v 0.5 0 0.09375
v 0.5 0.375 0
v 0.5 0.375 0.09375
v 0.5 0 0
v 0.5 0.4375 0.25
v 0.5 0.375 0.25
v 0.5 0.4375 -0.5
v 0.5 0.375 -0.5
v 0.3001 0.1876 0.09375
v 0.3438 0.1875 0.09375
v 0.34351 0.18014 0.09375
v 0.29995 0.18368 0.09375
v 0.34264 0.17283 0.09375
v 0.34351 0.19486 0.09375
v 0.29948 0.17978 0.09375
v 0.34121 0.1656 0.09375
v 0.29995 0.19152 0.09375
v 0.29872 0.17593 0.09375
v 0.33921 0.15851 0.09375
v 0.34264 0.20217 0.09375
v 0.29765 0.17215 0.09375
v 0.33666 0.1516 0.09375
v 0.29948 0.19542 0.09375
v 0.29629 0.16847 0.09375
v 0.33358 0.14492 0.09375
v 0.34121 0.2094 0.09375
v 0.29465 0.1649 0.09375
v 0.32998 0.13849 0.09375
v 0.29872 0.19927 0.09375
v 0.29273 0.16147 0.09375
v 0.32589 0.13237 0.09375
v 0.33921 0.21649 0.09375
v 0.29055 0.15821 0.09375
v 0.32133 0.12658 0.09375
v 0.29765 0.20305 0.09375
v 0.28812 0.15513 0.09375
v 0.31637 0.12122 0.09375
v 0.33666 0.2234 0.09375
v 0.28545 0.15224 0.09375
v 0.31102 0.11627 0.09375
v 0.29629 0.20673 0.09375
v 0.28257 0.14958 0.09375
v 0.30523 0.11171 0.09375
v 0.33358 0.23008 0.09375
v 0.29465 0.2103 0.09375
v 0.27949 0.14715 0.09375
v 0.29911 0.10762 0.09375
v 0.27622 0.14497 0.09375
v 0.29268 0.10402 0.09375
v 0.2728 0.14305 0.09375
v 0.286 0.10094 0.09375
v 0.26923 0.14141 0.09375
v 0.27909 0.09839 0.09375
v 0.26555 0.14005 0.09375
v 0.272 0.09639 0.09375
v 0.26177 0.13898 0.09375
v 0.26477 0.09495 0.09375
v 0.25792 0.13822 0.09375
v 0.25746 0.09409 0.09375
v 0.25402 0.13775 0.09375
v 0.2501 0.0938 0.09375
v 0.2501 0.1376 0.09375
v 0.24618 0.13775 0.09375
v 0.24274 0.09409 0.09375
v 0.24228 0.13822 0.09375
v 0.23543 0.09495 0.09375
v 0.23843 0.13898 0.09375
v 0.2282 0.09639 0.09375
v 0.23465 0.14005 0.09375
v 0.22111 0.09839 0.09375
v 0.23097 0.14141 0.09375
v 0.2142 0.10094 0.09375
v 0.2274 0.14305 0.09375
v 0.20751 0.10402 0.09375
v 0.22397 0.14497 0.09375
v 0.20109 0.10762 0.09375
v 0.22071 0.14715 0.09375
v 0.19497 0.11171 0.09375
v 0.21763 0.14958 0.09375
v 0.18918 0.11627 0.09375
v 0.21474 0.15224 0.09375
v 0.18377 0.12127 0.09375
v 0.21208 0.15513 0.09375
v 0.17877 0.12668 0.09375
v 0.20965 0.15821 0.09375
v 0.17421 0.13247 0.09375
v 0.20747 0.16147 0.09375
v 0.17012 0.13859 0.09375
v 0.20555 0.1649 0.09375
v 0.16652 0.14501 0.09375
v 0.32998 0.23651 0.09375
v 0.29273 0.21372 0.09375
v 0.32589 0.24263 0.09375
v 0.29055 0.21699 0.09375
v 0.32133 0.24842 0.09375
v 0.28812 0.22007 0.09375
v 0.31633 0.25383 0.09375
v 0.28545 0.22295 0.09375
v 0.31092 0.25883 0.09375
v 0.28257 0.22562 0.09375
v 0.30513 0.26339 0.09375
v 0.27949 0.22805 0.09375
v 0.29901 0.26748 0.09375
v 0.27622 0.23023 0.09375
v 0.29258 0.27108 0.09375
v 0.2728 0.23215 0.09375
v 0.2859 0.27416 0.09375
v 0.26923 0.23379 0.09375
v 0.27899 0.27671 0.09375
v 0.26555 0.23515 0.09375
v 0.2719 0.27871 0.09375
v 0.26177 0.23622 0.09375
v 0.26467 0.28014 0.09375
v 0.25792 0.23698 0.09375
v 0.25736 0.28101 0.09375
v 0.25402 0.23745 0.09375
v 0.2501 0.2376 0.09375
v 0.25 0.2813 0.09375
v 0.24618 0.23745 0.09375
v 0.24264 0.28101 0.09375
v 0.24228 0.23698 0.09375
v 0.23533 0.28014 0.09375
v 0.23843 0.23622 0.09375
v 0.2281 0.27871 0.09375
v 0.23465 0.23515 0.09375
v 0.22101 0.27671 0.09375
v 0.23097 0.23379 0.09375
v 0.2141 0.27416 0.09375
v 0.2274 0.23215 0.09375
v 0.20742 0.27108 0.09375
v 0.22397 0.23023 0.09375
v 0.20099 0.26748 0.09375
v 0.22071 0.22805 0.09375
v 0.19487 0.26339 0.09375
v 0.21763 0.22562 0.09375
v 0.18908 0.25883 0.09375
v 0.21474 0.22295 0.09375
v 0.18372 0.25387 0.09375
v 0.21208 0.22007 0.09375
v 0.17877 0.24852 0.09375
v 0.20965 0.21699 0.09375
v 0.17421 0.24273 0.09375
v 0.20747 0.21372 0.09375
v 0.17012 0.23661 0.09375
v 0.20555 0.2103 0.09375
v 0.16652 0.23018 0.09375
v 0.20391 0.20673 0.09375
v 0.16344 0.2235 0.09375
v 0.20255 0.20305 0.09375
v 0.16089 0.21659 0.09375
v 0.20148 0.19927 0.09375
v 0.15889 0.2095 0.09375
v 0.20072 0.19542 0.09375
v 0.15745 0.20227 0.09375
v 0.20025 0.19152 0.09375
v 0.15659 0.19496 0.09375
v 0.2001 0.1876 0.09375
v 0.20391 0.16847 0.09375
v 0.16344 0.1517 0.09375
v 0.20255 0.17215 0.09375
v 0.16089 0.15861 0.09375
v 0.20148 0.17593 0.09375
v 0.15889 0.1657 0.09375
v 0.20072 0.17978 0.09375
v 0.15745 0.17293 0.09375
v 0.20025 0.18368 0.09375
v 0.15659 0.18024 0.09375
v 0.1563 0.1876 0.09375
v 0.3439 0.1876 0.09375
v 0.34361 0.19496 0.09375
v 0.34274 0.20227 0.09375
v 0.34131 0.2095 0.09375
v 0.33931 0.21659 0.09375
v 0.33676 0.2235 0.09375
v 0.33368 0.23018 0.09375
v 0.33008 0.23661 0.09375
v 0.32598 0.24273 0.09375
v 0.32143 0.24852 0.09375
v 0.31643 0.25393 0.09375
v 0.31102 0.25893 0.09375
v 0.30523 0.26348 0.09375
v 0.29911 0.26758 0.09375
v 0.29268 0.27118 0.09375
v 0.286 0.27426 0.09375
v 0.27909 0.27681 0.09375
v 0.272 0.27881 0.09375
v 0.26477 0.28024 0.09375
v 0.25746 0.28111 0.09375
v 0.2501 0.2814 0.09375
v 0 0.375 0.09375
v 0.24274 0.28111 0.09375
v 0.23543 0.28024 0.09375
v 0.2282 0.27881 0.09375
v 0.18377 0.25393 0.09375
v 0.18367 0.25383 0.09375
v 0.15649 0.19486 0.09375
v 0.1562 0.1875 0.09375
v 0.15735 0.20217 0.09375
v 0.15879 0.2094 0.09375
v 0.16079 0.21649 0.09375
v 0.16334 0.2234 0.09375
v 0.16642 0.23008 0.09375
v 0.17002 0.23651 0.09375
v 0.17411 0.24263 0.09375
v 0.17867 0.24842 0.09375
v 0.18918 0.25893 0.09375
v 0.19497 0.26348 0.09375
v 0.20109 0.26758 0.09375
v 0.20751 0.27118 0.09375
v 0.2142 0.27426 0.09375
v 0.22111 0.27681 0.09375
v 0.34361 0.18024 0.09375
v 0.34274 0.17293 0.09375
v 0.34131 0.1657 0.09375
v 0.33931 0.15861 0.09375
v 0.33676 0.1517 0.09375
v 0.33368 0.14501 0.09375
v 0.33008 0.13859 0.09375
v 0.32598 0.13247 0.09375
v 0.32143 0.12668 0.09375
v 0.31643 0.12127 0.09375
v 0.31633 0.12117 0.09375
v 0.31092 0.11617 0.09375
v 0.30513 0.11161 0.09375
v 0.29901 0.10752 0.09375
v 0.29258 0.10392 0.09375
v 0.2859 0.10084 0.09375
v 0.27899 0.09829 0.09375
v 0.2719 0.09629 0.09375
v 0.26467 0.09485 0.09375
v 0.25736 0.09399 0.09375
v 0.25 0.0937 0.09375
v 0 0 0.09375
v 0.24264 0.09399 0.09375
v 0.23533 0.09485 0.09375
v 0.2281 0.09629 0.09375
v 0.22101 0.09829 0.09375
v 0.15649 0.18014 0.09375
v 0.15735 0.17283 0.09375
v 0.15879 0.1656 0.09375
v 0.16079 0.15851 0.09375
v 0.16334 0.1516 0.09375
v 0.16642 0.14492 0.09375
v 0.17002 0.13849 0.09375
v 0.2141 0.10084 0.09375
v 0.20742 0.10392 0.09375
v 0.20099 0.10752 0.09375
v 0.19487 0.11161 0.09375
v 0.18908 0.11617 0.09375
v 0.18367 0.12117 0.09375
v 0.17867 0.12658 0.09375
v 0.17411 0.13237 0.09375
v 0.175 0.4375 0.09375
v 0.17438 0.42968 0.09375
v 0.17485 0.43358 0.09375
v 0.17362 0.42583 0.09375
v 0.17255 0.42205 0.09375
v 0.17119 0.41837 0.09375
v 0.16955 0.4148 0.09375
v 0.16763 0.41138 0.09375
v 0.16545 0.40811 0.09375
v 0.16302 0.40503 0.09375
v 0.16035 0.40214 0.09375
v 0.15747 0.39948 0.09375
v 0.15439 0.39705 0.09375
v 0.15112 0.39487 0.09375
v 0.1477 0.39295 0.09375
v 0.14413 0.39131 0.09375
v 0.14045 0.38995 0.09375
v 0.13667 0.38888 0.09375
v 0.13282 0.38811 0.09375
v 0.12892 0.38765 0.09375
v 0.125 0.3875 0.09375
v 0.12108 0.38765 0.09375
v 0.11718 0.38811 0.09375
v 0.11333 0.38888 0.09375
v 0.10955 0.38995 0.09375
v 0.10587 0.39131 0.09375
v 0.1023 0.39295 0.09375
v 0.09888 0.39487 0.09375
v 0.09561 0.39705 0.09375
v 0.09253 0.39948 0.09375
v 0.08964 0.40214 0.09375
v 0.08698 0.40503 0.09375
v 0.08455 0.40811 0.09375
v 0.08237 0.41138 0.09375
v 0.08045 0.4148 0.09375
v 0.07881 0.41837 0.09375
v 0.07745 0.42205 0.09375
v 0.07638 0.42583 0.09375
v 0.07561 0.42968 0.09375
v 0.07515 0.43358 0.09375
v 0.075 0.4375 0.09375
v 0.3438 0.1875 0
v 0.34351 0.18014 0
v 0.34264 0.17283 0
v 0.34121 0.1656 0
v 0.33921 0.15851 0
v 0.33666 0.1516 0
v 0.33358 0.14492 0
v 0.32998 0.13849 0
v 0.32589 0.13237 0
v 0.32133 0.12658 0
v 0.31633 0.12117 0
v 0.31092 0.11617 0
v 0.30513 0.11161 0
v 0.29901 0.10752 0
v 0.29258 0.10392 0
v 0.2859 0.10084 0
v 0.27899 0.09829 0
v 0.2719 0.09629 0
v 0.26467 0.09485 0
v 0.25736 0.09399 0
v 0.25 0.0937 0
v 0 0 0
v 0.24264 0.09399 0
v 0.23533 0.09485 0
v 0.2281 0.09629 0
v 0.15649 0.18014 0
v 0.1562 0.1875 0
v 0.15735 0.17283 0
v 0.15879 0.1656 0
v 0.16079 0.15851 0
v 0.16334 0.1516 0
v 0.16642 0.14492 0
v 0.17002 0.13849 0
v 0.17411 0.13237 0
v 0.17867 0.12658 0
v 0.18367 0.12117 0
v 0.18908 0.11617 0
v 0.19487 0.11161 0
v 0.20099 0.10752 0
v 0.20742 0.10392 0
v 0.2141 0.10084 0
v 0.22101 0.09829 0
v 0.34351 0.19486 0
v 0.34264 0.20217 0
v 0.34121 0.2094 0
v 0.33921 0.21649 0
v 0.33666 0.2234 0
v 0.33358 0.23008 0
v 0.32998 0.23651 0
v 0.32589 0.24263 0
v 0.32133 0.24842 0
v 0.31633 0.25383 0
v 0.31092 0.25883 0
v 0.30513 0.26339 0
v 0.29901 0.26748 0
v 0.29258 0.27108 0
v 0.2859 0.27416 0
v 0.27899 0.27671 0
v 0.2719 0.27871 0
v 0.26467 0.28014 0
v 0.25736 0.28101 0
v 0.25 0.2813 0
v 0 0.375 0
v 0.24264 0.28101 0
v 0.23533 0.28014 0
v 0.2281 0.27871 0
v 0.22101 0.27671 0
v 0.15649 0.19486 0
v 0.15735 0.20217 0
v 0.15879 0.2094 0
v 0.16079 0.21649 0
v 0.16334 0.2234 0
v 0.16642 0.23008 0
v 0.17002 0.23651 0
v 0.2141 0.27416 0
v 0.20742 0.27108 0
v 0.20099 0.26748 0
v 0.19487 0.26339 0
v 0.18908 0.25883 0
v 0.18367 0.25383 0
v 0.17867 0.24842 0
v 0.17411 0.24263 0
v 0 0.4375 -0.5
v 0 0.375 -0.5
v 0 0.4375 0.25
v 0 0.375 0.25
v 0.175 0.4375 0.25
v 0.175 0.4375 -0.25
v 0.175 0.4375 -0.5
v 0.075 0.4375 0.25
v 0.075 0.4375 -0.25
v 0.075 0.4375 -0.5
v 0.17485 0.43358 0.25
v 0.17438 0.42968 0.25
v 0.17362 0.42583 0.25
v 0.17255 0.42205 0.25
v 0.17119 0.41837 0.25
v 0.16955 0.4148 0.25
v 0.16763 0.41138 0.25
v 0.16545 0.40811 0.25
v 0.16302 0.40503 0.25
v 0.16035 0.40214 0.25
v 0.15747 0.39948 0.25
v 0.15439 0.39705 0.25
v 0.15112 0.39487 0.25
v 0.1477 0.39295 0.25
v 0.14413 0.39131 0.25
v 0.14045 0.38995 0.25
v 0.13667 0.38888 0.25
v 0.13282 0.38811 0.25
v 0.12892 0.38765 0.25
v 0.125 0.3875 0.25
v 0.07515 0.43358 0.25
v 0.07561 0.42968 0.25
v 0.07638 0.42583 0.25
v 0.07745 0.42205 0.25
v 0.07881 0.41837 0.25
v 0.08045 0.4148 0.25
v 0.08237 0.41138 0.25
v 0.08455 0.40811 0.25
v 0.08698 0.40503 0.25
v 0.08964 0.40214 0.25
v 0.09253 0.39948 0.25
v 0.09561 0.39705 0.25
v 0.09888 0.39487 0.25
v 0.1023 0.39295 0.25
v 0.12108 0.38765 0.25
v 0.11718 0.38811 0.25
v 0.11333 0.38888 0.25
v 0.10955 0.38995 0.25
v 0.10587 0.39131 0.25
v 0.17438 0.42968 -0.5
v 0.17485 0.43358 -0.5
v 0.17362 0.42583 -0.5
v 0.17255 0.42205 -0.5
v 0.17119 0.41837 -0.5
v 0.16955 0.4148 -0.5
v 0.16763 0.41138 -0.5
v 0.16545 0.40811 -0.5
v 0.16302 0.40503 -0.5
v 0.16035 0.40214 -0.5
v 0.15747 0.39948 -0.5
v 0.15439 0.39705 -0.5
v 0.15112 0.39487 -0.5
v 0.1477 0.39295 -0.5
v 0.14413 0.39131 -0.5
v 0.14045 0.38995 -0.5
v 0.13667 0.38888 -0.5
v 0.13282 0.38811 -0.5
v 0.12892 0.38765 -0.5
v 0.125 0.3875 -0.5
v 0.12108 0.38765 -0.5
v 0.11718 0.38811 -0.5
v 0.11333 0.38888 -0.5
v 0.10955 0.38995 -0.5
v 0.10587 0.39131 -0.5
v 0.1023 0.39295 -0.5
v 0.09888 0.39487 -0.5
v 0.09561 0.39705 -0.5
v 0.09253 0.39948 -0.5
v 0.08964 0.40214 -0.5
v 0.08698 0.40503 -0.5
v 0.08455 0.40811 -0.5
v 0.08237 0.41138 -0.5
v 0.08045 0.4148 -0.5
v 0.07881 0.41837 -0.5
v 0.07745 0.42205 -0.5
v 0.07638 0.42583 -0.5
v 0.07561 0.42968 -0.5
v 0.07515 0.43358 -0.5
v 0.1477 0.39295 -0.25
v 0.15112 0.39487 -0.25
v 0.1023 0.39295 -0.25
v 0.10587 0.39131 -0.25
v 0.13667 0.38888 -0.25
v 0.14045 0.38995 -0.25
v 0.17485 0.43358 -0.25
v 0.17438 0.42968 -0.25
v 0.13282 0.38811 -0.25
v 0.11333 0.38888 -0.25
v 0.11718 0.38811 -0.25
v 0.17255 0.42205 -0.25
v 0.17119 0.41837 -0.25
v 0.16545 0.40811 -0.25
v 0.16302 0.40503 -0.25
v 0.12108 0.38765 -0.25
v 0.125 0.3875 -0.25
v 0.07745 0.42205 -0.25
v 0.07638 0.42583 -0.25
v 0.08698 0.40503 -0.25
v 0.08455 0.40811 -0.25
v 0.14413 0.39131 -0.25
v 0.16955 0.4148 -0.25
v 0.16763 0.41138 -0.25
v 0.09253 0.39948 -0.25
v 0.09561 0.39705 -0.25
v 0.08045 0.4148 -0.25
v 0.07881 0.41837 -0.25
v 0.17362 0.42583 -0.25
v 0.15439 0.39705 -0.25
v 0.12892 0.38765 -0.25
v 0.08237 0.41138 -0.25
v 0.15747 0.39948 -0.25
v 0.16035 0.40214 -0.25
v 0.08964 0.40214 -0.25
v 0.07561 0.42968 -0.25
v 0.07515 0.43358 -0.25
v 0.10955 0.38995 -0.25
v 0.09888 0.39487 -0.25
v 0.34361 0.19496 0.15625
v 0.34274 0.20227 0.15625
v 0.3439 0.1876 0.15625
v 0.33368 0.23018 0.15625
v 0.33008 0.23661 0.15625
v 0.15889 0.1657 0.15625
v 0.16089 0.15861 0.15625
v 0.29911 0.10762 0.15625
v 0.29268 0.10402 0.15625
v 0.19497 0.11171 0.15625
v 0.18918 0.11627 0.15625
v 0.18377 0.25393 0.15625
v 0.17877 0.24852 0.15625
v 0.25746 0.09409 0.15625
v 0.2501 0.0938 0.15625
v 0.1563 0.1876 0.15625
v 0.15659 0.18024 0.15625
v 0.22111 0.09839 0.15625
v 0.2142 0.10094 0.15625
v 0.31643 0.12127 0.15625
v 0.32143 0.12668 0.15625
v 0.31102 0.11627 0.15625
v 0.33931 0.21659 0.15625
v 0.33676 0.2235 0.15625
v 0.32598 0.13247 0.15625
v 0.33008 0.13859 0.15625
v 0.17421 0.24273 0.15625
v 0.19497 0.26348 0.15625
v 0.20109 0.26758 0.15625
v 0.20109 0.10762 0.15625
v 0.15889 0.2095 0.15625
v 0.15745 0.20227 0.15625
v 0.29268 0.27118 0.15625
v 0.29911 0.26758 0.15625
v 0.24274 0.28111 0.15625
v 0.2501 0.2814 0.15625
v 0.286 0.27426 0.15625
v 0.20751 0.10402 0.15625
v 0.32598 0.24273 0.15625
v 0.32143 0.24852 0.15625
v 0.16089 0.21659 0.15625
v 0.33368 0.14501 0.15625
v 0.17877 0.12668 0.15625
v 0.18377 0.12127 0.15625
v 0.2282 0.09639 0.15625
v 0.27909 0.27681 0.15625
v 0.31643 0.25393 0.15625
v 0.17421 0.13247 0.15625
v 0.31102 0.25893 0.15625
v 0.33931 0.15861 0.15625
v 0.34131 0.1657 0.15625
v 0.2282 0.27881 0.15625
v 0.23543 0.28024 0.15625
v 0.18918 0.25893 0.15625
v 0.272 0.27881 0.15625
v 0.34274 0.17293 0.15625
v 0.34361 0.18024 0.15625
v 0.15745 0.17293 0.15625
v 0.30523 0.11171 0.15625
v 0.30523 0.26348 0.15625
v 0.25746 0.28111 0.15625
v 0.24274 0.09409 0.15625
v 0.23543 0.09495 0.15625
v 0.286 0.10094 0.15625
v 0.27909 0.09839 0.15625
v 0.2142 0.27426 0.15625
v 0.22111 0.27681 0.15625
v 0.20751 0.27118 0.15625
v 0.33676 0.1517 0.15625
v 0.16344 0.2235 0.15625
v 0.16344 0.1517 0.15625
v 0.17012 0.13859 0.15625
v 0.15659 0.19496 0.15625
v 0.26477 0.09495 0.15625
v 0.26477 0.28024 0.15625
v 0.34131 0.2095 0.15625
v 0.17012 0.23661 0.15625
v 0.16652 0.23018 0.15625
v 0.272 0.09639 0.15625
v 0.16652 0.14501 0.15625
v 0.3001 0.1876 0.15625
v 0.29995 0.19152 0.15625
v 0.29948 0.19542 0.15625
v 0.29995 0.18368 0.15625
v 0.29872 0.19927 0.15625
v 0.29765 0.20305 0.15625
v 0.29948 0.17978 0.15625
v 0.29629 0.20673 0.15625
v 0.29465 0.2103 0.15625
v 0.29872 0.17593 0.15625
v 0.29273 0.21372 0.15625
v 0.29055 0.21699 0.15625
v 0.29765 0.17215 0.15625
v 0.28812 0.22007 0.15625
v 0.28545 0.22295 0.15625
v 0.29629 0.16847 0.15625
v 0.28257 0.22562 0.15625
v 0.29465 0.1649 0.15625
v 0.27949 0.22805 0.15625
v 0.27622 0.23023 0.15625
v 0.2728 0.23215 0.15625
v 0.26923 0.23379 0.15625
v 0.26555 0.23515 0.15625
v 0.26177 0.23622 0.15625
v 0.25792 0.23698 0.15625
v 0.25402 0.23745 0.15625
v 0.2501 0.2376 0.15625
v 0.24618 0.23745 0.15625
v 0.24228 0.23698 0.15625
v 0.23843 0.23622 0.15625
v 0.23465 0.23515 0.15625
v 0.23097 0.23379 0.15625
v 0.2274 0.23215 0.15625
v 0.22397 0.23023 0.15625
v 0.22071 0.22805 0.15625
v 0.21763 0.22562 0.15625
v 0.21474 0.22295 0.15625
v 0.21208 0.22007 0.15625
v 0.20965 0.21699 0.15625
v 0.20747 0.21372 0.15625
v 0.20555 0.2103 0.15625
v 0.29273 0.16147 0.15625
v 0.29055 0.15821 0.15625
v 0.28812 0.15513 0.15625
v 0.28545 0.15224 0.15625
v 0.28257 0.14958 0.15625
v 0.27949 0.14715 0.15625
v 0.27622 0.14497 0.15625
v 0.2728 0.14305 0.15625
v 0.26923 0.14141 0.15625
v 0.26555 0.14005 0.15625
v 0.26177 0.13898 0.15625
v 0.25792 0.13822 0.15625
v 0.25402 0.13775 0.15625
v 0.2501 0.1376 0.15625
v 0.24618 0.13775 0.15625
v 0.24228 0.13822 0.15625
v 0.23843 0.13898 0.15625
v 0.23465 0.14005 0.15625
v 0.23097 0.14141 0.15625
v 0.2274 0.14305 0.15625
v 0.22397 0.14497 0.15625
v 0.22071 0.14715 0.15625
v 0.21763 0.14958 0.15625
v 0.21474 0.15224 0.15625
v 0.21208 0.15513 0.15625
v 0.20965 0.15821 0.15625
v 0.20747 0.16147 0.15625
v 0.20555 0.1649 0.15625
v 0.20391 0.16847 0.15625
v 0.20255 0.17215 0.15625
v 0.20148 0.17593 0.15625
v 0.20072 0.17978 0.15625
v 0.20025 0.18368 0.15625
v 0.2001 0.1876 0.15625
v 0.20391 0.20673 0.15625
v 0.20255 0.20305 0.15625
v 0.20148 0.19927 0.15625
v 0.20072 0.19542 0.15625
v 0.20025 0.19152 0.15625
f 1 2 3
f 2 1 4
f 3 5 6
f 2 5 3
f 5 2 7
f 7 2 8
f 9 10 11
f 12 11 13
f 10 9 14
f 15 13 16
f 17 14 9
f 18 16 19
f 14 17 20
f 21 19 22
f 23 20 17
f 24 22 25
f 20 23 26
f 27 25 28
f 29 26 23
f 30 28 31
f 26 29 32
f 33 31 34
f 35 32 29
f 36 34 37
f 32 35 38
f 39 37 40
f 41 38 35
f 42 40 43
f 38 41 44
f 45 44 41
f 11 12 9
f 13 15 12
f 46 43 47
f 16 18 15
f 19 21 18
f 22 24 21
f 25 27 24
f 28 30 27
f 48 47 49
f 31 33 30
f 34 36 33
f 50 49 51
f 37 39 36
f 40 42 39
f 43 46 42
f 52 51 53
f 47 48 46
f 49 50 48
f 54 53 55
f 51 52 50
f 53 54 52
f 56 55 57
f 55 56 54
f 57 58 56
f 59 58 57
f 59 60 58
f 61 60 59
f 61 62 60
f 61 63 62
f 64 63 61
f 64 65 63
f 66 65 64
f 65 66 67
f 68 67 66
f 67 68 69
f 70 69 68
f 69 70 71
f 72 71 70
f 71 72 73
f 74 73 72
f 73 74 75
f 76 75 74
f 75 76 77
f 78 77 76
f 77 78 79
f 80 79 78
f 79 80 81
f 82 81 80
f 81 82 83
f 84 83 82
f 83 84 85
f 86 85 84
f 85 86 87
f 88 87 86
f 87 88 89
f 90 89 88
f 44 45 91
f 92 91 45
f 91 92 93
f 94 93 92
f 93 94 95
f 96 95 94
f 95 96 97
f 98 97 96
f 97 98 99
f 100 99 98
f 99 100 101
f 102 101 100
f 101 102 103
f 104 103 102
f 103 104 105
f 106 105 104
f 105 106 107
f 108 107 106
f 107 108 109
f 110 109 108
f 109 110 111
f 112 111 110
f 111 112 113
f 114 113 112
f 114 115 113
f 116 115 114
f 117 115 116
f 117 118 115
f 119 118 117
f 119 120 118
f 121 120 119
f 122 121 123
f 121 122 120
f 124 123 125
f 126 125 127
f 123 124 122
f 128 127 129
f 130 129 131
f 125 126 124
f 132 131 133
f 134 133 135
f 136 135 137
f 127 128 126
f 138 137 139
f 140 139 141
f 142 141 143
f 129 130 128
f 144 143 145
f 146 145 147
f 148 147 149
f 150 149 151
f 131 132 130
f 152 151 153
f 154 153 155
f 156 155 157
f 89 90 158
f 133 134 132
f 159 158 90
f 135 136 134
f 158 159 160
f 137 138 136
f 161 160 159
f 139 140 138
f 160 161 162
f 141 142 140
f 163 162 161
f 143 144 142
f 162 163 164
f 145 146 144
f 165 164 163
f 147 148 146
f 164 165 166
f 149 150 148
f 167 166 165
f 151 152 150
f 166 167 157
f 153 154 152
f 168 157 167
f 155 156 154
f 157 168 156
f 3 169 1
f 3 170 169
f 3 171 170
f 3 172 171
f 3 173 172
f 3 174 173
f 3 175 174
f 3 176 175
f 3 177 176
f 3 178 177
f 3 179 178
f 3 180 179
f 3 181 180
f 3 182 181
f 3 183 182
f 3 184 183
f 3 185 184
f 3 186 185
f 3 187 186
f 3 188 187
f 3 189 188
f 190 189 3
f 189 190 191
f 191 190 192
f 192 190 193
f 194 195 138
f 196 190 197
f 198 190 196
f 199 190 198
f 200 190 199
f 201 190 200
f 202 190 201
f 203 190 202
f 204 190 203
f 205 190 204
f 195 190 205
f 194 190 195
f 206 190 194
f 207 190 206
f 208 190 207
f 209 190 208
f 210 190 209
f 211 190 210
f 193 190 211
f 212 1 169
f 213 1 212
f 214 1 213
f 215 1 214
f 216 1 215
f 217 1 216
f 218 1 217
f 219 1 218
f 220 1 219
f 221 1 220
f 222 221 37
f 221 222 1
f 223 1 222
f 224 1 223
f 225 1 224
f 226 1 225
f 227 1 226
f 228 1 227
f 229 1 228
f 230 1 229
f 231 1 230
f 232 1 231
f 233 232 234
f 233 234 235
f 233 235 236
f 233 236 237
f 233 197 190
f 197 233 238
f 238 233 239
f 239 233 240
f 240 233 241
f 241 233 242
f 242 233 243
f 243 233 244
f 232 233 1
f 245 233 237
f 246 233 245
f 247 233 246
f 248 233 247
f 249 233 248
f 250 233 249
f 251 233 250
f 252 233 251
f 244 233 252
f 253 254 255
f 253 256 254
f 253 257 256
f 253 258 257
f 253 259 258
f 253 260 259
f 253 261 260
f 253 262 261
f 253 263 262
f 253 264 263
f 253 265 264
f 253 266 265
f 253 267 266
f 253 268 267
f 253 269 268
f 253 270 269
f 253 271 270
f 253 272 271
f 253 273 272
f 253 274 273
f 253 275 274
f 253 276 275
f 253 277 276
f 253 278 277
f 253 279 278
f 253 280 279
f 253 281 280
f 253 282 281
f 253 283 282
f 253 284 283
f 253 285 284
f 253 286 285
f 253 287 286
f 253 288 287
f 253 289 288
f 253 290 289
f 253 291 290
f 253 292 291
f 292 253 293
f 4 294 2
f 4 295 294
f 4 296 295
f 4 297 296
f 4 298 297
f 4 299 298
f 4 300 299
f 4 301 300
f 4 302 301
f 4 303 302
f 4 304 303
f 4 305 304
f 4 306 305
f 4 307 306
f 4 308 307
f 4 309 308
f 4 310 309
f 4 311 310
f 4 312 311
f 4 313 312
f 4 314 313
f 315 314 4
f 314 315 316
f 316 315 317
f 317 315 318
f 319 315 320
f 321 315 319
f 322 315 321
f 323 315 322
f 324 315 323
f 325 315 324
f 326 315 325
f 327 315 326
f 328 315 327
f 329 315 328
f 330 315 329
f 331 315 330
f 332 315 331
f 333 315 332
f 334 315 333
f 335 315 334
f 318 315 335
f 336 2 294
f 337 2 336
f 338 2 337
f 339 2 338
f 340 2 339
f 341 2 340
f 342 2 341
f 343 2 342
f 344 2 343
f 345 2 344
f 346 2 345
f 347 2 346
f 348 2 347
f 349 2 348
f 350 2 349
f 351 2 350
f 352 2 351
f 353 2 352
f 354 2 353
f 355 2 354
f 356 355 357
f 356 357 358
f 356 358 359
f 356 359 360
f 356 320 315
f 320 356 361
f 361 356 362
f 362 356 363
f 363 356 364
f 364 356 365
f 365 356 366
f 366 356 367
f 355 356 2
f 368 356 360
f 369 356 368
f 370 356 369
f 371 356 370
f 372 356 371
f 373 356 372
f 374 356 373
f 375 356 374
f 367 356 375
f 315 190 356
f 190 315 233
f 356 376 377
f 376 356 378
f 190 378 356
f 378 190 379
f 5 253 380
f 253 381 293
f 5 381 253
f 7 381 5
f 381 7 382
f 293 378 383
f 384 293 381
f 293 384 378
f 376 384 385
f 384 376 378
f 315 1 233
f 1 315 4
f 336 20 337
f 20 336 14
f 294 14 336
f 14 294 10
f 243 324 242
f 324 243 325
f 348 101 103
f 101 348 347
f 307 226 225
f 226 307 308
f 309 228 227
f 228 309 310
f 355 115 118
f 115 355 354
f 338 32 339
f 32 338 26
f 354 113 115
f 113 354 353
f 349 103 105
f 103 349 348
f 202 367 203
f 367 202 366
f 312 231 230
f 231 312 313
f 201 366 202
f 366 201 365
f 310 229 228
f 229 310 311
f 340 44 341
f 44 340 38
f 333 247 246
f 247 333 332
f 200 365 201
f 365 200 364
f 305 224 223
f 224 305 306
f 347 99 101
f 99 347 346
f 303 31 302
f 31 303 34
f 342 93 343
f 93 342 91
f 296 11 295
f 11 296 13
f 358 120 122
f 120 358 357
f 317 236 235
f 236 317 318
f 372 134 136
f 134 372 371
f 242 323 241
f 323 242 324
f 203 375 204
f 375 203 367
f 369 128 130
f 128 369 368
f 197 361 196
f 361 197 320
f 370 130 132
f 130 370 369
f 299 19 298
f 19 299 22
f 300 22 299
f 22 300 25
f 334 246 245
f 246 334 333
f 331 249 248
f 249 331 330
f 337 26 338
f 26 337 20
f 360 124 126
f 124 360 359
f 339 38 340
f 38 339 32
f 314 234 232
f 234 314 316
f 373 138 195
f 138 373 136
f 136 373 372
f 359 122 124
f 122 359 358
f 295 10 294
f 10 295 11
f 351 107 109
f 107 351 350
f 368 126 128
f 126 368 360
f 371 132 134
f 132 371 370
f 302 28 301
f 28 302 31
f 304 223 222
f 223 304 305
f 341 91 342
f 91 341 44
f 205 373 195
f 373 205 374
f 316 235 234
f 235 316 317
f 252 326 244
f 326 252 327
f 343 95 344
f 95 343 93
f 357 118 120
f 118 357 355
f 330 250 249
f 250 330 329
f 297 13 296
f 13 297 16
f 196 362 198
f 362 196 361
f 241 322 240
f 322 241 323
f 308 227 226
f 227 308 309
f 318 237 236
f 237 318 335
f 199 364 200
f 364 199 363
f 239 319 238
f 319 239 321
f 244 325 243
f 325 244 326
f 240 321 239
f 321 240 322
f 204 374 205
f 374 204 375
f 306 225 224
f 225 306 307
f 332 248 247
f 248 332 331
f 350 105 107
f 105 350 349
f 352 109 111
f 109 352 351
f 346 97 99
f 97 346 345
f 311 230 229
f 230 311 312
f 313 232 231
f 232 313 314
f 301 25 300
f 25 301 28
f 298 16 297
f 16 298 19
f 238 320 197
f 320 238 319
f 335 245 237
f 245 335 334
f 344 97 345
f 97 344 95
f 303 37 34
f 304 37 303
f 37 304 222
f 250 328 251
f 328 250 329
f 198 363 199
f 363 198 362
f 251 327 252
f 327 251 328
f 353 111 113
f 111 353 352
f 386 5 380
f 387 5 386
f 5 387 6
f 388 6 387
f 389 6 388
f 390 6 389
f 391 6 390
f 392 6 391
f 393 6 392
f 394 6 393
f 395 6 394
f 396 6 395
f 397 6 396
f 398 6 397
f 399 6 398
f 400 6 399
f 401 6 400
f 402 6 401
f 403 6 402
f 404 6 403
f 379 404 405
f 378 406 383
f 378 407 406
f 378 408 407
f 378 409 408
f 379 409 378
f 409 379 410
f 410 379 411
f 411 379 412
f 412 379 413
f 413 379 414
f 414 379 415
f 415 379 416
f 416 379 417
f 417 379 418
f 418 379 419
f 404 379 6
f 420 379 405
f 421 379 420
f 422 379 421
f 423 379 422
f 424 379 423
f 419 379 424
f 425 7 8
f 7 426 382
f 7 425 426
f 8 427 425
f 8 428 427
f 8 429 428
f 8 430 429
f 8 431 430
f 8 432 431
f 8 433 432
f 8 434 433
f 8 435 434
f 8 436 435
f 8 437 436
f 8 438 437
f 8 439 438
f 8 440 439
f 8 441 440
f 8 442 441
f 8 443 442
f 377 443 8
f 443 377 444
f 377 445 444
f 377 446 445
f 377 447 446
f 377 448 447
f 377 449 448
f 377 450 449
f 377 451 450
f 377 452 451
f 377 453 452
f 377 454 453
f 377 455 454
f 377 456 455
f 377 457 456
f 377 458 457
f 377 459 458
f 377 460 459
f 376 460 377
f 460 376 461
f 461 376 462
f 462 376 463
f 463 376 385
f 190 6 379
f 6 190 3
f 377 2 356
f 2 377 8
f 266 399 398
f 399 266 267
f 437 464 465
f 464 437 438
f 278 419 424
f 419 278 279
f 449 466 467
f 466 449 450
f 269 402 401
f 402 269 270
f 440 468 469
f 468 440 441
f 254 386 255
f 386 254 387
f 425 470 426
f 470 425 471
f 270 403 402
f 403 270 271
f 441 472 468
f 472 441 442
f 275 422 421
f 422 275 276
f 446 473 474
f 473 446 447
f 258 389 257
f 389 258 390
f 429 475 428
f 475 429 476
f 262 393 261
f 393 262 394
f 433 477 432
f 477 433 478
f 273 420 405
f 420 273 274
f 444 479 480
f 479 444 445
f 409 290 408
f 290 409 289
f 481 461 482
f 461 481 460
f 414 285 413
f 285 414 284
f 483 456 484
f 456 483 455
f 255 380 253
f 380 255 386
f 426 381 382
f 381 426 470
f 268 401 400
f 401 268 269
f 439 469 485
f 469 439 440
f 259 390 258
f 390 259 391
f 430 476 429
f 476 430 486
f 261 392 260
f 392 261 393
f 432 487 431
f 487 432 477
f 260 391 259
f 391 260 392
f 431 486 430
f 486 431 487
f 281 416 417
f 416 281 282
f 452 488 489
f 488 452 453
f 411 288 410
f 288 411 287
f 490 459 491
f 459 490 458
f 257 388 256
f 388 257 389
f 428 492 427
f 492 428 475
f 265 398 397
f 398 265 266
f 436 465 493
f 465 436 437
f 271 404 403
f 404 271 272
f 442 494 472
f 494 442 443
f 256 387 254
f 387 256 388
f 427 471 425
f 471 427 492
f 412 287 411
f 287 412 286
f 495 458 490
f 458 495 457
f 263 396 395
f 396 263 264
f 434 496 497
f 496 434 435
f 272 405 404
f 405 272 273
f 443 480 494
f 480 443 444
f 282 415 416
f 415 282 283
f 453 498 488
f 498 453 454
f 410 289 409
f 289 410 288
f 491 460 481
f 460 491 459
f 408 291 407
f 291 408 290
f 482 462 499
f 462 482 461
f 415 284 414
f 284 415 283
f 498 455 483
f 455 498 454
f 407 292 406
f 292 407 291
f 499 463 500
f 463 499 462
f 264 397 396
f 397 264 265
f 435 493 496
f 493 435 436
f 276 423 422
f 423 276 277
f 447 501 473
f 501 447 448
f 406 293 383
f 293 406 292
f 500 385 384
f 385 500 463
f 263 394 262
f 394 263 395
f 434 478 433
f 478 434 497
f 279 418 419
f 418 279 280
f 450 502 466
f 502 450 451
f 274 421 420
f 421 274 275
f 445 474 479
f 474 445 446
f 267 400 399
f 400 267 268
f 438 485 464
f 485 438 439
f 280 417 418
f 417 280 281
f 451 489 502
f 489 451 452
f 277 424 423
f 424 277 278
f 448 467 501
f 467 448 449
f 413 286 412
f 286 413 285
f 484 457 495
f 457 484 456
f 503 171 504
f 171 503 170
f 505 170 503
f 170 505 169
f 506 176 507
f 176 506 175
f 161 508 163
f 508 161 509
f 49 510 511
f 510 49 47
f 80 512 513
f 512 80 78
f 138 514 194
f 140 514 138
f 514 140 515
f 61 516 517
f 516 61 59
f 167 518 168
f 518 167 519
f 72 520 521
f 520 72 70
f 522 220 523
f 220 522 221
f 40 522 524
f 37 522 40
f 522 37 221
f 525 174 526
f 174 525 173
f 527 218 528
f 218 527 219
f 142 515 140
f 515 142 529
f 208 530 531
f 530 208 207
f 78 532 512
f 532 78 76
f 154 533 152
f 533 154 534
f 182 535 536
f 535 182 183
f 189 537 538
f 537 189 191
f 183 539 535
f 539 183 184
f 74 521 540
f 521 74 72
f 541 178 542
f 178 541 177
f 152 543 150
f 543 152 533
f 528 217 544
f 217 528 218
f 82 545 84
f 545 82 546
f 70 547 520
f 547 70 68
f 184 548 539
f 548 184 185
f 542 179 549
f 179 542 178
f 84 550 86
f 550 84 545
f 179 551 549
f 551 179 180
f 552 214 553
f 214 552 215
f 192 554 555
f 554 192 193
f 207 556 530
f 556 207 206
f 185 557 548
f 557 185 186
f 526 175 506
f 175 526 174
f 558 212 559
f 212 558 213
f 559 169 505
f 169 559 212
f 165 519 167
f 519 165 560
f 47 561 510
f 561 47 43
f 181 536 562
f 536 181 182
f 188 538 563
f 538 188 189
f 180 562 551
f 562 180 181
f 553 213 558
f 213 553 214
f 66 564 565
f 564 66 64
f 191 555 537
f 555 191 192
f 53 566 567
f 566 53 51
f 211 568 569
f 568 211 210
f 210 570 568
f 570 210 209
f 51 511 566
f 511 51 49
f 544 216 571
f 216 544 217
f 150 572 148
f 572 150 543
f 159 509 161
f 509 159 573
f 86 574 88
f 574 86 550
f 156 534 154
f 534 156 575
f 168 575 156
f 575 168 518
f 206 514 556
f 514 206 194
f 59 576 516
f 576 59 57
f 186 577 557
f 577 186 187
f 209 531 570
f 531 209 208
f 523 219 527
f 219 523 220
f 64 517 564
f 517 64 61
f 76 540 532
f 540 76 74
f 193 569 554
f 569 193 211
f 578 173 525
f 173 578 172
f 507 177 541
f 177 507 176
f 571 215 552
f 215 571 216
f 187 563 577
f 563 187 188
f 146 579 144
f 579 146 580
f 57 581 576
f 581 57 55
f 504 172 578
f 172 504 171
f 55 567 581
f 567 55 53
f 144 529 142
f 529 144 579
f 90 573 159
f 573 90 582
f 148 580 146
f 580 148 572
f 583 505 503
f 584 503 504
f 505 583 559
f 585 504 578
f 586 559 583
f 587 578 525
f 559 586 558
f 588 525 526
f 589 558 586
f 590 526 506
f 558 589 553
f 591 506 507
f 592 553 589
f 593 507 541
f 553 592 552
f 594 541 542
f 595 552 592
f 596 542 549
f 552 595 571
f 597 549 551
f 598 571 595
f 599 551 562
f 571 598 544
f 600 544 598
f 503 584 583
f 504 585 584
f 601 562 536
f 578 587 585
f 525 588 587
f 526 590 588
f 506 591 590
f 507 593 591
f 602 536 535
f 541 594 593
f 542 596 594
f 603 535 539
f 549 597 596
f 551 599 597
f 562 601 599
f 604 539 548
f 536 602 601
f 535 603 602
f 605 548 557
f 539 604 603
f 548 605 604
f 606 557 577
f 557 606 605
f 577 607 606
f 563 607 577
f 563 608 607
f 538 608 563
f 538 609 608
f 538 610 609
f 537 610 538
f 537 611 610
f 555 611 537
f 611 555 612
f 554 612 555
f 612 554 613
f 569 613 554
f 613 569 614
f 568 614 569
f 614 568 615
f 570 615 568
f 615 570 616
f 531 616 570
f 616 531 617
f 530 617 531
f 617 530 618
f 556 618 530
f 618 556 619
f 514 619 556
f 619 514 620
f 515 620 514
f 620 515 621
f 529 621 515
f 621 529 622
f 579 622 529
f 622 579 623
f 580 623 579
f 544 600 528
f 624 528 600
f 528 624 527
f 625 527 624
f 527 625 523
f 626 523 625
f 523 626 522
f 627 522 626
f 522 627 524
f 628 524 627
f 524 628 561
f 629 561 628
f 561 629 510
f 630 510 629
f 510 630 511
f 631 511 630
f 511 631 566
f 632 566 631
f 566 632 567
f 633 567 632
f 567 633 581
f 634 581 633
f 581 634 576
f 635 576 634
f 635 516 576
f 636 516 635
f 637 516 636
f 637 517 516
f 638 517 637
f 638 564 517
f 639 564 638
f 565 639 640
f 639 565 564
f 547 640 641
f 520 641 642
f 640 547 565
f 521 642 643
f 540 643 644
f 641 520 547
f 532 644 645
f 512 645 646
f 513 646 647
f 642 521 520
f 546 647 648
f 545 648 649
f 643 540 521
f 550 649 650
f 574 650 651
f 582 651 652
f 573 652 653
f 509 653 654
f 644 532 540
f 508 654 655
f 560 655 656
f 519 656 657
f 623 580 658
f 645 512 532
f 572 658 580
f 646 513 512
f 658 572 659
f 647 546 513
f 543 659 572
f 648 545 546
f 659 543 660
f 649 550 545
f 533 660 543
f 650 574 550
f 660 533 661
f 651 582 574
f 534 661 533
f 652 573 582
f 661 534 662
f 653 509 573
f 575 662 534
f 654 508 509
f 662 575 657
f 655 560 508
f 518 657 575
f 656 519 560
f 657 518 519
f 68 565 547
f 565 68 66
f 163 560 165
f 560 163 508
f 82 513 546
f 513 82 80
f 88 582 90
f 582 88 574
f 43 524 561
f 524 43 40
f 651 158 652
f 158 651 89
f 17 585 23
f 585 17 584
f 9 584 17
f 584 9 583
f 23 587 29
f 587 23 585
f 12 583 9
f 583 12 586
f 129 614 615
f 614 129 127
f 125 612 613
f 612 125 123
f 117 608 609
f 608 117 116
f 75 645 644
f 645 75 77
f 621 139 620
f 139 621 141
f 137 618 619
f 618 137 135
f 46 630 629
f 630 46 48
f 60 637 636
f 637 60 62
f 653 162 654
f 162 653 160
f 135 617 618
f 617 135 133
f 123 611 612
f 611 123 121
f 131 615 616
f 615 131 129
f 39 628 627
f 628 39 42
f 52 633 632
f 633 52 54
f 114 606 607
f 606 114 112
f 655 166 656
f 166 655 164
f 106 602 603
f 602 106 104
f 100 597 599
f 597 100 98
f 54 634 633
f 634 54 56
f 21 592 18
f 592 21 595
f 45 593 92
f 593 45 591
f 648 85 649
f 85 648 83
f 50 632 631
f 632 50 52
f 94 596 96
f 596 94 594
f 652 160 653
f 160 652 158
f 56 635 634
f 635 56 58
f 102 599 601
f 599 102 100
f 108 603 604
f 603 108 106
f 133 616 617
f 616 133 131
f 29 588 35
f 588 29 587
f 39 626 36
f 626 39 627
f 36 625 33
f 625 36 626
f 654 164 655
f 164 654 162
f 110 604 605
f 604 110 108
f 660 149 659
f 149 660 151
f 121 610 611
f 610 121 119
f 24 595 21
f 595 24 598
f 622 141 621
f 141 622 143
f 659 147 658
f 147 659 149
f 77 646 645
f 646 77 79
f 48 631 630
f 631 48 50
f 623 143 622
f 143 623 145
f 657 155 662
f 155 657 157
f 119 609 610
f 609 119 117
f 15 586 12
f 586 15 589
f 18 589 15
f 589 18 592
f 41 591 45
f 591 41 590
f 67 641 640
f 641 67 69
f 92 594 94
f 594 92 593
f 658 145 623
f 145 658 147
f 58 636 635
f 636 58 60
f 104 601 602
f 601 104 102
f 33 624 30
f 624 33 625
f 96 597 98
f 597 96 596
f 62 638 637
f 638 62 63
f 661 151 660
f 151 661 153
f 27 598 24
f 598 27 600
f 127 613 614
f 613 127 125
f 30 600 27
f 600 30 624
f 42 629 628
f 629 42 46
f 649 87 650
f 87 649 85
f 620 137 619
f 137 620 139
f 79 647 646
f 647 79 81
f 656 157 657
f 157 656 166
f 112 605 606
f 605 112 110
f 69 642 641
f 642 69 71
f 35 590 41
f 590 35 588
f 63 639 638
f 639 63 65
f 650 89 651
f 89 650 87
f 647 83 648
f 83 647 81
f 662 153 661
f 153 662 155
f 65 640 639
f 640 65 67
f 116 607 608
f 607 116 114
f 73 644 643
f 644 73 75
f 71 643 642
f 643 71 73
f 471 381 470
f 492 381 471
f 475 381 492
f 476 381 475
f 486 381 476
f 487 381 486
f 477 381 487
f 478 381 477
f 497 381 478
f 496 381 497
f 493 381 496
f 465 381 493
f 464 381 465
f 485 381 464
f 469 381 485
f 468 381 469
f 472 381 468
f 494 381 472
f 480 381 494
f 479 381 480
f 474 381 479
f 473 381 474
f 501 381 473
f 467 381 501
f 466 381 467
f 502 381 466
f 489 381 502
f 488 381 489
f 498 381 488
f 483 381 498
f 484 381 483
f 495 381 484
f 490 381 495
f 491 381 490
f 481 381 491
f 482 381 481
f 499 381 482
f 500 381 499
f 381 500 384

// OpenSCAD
// Parametric design for base with features

// --- Base dimensions ---
base_length   = 0.5;
base_width    = 0.4375;
base_height   = 0.09375;   // thickness of main rectangular base

// --- Base circular void ---
hole_radius   = 0.0938;
hole_center_x = 0.25;
hole_center_y = 0.1875;

// --- Underside solid strip (back edge, below base) ---
strip_width   = 0.0625;
strip_y_min   = 0.375;          // front offset 0.375 from y=0
strip_y_max   = strip_y_min + strip_width; // back offset 0 (flush with base back edge)
strip_z_bot1  = -0.25;          // extends 0.25 below base underside
strip_z_top1  = 0;              // starts at base underside

// --- Other back-edge solid (extends both above and below base) ---
strip_z_bot2  = -0.5;
strip_z_top2  = 0.25;
hole2_radius  = 0.05;
hole2_center_x = 0.125;
hole2_center_y = 0.4375;        // back edge (y = base_width)

// --- Annular collar on top of base ---
collar_outer_r = 0.0938;
collar_inner_r = 0.05;
collar_height  = 0.0625;
collar_center_x = 0.2501;
collar_center_y = 0.1876;
collar_z_base = base_height;    // top surface of base

// Resolution
$fn = 80;  // smooth curves

// ---------- modules ----------

module base_plate() {
    difference() {
        // main rectangular base
        cube([base_length, base_width, base_height], center=false);
        // through hole
        translate([hole_center_x, hole_center_y, -1])
            cylinder(h = base_height + 2, r = hole_radius);
    }
}

module underside_strip() {
    // solid strip along back edge, below the base
    translate([0, strip_y_min, strip_z_bot1])
        cube([base_length, strip_width, strip_z_top1 - strip_z_bot1]);
}

module back_strip_with_hole() {
    difference() {
        // solid strip extending from -0.5 below to 0.25 above
        translate([0, strip_y_min, strip_z_bot2])
            cube([base_length, strip_width, strip_z_top2 - strip_z_bot2]);
        // circular void at given position through full height of strip
        translate([hole2_center_x, hole2_center_y, strip_z_bot2 - 0.01])
            cylinder(h = strip_z_top2 - strip_z_bot2 + 0.02, r = hole2_radius);
    }
}

module annular_collar() {
    // ring on top of base around the main hole
    difference() {
        translate([collar_center_x, collar_center_y, collar_z_base])
            cylinder(h = collar_height, r = collar_outer_r);
        translate([collar_center_x, collar_center_y, collar_z_base - 0.01])
            cylinder(h = collar_height + 0.02, r = collar_inner_r);
    }
}

// ---------- assembly ----------
union() {
    base_plate();
    underside_strip();
    back_strip_with_hole();
    annular_collar();
}
